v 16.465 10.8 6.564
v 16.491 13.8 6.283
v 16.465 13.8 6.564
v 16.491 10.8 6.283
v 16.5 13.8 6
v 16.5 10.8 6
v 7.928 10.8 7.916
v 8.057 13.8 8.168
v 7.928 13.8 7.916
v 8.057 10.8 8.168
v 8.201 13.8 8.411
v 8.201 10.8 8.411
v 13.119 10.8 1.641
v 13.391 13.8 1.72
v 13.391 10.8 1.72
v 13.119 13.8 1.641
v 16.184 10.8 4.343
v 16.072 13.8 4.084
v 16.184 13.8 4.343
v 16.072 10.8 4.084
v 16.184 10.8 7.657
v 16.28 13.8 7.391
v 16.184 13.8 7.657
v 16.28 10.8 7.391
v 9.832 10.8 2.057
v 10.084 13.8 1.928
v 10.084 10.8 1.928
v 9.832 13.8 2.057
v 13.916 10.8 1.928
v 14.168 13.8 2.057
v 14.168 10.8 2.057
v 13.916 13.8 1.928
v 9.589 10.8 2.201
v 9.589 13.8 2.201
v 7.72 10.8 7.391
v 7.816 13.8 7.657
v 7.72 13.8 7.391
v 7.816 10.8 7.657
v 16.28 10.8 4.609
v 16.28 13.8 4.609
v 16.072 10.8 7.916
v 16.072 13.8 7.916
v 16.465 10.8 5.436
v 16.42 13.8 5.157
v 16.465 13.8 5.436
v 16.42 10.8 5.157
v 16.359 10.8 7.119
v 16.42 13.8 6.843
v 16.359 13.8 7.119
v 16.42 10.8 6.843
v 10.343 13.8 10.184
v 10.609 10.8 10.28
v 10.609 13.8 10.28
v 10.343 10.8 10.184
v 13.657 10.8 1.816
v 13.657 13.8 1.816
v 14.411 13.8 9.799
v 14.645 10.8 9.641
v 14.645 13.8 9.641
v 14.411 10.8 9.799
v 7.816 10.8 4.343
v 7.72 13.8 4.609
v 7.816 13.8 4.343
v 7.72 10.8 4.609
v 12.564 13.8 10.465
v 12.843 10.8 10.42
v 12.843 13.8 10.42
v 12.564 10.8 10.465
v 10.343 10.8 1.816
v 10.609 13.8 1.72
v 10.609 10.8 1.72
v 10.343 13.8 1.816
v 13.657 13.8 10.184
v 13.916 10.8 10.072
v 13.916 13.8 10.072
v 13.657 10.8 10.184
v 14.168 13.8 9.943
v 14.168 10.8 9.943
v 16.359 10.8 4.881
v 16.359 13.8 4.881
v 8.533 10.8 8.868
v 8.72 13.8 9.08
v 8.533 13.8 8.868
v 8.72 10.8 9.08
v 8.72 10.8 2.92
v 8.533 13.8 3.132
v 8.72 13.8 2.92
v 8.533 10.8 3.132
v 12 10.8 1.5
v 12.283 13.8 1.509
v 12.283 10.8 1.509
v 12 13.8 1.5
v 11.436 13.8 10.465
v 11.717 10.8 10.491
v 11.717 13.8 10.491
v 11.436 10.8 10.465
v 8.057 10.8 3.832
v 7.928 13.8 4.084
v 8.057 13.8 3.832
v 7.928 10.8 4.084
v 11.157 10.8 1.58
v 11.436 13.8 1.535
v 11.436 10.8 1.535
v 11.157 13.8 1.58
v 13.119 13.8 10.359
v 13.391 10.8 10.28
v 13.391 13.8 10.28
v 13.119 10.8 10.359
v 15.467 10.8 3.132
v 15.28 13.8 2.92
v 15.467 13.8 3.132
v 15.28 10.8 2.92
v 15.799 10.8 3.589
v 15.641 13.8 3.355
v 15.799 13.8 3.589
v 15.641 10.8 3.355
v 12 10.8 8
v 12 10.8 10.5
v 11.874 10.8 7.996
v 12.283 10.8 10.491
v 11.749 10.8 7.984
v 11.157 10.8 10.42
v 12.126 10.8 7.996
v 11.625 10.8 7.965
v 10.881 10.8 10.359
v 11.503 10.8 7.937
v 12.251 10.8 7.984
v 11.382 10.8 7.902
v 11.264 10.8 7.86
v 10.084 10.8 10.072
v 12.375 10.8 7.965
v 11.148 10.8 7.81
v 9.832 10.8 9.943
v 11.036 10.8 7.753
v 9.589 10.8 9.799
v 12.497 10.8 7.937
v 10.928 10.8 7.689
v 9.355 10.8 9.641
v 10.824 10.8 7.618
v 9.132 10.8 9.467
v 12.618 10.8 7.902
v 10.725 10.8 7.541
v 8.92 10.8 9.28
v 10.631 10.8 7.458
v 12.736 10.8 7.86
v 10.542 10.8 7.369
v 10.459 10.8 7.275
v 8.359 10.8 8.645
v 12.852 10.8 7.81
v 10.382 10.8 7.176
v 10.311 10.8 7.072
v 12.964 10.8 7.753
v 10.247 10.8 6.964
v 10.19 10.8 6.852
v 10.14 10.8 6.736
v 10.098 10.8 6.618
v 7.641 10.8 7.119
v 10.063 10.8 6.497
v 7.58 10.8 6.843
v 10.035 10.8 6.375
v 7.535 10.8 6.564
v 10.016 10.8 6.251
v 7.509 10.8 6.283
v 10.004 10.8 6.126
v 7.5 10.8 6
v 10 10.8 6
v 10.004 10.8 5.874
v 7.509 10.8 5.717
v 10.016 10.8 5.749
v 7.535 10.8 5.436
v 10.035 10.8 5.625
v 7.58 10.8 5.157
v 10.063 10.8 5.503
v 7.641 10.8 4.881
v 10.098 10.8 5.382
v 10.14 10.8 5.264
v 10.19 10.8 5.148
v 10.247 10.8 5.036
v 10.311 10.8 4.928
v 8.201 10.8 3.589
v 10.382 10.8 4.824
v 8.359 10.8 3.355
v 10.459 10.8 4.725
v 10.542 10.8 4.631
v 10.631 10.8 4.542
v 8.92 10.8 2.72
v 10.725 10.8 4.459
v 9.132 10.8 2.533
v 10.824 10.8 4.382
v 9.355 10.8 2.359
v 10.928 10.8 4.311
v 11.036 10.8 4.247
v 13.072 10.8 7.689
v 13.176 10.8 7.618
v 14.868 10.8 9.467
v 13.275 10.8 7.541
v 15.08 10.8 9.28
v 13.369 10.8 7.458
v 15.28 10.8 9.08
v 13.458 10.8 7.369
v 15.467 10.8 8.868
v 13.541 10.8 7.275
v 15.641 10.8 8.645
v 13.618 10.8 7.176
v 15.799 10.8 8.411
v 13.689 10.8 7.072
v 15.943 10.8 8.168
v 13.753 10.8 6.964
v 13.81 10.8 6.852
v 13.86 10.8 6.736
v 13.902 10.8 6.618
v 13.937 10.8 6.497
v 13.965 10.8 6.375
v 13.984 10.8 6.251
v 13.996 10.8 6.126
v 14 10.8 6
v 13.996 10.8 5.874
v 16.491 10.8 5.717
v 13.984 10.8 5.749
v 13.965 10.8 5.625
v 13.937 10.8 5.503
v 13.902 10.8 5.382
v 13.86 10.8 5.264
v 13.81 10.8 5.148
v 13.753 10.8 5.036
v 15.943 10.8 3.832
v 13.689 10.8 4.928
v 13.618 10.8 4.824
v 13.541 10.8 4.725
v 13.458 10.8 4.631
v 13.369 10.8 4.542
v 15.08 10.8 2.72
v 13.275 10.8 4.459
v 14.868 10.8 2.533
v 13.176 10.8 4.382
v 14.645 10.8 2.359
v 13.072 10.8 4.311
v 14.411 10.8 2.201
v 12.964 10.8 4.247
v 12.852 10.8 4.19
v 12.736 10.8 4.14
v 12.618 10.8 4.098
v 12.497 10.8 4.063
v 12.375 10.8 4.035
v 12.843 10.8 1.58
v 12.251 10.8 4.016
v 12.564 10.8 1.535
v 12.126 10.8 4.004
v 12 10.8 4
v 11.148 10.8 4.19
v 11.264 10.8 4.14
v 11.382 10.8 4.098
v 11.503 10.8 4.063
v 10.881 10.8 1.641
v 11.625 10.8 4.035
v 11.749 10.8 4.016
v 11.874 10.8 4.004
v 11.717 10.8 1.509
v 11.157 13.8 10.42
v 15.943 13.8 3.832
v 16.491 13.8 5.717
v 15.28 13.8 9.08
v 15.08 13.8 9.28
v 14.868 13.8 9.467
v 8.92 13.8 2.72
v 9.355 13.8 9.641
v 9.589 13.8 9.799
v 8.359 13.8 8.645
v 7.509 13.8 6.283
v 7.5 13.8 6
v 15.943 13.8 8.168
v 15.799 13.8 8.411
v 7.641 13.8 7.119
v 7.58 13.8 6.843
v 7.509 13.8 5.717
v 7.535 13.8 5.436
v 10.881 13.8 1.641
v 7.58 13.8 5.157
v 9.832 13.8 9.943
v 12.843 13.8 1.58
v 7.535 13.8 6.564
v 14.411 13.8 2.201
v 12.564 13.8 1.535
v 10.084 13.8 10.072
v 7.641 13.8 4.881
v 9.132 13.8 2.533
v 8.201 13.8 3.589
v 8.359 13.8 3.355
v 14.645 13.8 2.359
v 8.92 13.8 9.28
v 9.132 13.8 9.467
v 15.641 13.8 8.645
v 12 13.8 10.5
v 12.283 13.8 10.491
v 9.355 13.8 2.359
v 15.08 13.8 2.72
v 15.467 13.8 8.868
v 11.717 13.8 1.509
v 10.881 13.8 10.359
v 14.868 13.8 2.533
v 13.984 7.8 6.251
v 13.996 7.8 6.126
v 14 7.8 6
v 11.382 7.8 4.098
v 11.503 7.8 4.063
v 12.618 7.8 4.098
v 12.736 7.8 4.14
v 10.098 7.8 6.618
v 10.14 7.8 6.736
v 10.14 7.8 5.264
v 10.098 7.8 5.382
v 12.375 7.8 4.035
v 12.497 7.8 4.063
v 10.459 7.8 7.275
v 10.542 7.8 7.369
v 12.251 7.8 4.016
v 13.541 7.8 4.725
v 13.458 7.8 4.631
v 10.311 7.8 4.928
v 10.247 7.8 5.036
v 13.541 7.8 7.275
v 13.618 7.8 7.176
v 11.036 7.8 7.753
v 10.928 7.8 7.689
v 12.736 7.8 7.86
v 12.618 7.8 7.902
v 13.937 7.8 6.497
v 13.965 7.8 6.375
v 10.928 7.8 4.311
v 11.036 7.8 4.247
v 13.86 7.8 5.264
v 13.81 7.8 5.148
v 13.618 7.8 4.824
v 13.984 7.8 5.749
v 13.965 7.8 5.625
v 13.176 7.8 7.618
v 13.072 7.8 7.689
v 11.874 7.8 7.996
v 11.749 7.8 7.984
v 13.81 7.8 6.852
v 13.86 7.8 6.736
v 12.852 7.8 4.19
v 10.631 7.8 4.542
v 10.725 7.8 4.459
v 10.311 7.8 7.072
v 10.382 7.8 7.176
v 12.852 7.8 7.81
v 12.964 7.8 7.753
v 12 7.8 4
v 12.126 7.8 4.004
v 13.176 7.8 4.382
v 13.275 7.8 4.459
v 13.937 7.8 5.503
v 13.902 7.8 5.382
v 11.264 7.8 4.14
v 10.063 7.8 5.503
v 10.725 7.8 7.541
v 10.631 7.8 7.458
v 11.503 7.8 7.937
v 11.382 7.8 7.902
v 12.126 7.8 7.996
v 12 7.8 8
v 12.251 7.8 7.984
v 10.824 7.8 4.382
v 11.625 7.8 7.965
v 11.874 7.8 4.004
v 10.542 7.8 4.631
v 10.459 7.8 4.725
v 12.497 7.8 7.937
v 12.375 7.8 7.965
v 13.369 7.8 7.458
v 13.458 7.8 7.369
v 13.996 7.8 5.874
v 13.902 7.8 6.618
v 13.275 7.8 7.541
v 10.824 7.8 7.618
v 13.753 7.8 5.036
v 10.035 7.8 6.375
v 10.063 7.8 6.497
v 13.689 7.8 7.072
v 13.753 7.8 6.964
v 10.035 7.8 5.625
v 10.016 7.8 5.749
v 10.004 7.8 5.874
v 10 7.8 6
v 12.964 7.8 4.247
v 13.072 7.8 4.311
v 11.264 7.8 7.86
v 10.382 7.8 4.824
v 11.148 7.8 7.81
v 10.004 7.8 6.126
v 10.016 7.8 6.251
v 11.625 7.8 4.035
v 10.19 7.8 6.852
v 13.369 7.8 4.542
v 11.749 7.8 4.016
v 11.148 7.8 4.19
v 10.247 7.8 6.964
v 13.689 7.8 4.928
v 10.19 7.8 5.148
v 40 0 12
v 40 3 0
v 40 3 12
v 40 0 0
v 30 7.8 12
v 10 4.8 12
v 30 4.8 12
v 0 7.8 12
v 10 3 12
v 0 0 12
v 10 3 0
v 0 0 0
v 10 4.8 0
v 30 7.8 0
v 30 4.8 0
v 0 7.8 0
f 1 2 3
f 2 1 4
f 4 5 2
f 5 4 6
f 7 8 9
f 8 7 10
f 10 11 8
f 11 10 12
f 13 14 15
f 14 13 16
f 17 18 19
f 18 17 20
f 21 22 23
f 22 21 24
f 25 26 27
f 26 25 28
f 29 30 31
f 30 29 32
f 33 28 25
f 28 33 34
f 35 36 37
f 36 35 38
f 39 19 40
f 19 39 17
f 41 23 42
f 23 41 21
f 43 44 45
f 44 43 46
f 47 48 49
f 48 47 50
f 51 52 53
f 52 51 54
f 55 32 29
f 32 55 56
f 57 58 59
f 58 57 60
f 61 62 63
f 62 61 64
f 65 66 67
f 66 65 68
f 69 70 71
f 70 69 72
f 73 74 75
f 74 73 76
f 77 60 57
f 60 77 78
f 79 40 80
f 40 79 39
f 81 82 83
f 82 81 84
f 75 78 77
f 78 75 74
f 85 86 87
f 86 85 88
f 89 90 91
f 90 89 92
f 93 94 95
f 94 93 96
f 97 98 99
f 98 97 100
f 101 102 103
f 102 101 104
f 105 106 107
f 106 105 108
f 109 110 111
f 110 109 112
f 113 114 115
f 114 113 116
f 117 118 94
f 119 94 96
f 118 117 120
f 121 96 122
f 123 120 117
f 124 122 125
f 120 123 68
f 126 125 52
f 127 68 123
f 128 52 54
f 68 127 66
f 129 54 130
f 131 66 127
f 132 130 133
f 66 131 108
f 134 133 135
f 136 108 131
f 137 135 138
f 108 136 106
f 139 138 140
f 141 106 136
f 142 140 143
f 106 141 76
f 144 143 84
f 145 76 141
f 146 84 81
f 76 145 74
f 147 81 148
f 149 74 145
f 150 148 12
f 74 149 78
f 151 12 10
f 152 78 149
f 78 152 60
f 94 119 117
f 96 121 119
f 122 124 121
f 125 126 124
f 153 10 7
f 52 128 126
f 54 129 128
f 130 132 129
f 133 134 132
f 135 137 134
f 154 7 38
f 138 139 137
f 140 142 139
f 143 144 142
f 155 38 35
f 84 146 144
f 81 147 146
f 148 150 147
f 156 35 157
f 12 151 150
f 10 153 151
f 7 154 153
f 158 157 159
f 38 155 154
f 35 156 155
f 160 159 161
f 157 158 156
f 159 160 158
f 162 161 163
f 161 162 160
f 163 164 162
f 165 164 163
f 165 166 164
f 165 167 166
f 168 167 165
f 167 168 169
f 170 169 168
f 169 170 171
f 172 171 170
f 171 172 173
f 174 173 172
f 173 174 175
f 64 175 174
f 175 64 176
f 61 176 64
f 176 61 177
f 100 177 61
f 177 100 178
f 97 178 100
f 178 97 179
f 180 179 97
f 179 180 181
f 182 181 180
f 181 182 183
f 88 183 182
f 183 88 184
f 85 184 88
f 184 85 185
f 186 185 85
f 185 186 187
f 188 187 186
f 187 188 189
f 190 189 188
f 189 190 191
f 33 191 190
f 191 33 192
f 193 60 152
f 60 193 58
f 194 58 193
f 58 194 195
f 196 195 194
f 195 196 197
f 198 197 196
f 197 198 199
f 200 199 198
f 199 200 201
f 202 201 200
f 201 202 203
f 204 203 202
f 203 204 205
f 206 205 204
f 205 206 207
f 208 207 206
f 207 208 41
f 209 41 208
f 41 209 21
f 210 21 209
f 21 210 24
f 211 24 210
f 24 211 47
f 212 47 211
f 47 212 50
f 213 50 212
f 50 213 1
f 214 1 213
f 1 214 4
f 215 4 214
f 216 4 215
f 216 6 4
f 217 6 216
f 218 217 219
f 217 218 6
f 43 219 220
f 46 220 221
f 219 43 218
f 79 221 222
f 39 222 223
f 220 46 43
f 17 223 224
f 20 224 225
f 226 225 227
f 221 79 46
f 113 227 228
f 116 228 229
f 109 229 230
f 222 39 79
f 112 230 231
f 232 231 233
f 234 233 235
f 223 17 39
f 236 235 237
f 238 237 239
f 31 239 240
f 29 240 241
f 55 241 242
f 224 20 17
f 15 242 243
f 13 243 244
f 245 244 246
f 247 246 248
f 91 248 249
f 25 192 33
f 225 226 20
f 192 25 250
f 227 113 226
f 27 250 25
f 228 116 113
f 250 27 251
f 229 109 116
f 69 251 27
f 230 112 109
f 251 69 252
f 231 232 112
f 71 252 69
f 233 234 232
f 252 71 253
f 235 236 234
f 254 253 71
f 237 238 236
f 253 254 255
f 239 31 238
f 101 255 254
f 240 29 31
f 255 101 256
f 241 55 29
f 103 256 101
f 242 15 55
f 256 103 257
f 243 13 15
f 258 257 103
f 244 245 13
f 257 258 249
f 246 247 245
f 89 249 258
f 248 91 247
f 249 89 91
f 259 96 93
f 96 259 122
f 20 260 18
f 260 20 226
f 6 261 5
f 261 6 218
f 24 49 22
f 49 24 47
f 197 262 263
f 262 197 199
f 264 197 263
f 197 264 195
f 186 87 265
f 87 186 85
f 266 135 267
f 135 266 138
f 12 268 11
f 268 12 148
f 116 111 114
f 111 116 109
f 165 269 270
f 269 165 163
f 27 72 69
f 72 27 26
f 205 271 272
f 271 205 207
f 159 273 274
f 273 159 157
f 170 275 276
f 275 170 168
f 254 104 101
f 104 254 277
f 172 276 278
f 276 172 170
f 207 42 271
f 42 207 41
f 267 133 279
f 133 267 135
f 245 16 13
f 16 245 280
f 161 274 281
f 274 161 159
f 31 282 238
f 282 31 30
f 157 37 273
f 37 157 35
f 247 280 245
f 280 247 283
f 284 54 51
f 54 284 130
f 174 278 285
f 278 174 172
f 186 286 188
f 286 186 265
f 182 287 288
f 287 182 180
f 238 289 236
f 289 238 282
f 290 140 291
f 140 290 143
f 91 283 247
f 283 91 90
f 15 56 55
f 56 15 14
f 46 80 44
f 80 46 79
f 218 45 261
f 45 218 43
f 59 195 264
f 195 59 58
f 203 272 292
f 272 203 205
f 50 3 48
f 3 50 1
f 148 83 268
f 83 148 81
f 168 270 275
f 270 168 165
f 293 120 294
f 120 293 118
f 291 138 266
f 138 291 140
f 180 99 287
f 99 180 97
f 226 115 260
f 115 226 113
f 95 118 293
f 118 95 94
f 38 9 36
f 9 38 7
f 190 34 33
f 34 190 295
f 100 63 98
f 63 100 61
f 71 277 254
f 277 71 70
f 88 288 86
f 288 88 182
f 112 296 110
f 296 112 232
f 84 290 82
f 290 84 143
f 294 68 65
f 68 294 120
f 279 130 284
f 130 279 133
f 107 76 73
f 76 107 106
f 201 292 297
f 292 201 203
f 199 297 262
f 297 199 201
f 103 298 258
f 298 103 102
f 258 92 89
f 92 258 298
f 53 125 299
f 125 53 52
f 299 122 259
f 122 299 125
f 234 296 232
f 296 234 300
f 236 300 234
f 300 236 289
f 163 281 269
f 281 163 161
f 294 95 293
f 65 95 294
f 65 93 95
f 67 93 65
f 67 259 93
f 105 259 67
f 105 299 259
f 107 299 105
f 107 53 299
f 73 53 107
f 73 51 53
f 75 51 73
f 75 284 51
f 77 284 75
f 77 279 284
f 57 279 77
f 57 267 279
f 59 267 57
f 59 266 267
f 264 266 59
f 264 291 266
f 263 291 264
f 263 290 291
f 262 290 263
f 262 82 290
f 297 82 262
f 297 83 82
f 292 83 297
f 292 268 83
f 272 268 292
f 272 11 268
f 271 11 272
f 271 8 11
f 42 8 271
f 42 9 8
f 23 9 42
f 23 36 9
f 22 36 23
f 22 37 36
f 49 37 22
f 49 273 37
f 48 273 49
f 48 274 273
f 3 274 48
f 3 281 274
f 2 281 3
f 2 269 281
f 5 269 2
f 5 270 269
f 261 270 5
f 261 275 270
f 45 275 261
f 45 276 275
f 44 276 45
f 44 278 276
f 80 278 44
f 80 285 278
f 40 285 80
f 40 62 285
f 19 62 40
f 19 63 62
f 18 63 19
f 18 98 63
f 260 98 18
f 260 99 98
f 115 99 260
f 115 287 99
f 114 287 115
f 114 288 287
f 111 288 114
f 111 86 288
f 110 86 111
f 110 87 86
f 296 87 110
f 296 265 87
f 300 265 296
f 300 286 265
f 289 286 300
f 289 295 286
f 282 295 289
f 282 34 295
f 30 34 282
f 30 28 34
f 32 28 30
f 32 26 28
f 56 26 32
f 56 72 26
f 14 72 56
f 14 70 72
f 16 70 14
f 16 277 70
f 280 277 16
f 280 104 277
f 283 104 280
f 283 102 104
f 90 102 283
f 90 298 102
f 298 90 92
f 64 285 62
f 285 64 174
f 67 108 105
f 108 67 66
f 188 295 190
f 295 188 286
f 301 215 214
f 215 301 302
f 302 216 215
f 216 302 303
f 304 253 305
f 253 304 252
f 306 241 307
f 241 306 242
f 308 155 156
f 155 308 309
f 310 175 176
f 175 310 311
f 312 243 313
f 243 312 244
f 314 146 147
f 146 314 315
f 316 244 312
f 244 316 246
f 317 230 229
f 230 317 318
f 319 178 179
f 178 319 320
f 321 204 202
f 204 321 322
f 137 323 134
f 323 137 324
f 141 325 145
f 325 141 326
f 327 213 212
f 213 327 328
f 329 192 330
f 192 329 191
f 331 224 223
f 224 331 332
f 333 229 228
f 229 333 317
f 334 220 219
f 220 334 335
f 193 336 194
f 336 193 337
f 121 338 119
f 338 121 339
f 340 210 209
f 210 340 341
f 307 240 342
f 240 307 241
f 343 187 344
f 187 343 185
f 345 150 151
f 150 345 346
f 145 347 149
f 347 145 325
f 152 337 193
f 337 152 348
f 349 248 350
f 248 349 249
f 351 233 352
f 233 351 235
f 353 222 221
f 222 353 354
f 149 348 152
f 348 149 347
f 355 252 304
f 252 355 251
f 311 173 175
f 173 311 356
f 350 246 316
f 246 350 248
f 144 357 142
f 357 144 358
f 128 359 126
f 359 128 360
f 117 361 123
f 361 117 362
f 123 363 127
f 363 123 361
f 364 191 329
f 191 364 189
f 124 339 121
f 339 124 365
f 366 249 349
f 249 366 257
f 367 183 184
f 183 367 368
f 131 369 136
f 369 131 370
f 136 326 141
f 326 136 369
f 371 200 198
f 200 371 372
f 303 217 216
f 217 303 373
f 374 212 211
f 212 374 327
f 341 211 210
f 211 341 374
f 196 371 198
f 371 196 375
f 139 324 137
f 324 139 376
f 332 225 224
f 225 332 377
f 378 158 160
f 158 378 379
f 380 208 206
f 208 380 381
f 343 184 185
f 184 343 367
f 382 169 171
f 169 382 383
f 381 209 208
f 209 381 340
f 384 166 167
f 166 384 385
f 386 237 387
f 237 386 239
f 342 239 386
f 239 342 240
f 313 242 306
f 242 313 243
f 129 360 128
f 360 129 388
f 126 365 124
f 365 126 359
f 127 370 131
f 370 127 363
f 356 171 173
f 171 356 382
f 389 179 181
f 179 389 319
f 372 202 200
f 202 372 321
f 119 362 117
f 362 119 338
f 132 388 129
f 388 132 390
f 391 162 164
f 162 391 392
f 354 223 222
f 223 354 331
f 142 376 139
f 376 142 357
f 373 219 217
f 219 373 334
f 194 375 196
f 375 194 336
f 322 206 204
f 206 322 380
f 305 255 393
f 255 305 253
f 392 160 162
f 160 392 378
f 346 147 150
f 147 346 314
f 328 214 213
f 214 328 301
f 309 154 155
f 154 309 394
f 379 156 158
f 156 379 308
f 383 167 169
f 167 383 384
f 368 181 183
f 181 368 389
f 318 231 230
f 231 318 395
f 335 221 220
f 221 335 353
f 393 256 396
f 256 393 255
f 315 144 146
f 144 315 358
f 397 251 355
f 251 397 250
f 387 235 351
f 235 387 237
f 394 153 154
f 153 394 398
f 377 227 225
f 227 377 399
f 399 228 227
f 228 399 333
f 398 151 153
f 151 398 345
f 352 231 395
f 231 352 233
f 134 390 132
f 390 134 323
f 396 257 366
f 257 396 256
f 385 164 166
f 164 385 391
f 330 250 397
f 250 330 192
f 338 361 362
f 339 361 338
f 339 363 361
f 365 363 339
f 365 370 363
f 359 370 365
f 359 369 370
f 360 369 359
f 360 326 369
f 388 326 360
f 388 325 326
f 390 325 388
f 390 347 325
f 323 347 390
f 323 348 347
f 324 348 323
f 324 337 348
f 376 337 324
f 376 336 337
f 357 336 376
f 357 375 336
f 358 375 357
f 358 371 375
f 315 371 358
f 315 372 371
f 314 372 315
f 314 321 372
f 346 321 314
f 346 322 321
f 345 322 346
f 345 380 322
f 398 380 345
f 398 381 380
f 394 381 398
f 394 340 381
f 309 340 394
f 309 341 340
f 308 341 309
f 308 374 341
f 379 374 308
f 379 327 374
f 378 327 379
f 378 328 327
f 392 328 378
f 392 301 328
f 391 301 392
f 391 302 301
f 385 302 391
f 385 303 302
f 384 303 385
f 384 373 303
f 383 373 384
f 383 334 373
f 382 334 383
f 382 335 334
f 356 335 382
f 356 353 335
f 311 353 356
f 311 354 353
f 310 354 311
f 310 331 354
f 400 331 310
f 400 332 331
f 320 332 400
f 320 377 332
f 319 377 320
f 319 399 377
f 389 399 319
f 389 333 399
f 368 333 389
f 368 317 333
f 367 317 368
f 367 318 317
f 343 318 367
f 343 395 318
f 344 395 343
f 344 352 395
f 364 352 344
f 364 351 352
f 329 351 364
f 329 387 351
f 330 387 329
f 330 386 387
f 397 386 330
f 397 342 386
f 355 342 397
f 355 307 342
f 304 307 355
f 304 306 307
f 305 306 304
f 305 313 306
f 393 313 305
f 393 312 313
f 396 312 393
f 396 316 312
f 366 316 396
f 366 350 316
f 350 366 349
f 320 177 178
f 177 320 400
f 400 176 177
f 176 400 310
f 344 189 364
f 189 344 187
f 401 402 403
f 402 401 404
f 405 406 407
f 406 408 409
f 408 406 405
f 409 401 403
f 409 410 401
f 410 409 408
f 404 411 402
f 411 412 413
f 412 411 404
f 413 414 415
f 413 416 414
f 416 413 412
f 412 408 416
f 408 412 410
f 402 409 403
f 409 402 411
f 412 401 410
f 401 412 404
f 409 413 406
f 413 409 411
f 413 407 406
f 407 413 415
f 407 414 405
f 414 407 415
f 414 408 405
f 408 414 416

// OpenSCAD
width=12;

backdepth=3;
backhang=40;

backwidth=1.8;

union() {

    
color("yellow") {
  cube([backhang, backdepth, width]);
}

translate([0, backdepth, 0]) {
  color("blue") {
    cube([10, backwidth, width]);
  }
}

fronthang=30;

translate([0, backdepth+backwidth, 0]) {
  color("red") {
    cube([fronthang, backdepth, width]);
  }
}

cap_radius = 9 / 2;
shaft_radius = 4 / 2;
cap_position = backdepth + backwidth + backdepth + backdepth + 3;

color("green") {
    translate([fronthang - cap_radius * 4, cap_position, width/2 ]) {
        rotate([90, 0, 0]) {
            union() {
                cylinder(h=3, r1=cap_radius , r2=cap_radius, center=false, $fn=100);
                cylinder(h=6, r1=shaft_radius, r2=shaft_radius, center=false, $fn=100);
            }
        }
    }
}

}
